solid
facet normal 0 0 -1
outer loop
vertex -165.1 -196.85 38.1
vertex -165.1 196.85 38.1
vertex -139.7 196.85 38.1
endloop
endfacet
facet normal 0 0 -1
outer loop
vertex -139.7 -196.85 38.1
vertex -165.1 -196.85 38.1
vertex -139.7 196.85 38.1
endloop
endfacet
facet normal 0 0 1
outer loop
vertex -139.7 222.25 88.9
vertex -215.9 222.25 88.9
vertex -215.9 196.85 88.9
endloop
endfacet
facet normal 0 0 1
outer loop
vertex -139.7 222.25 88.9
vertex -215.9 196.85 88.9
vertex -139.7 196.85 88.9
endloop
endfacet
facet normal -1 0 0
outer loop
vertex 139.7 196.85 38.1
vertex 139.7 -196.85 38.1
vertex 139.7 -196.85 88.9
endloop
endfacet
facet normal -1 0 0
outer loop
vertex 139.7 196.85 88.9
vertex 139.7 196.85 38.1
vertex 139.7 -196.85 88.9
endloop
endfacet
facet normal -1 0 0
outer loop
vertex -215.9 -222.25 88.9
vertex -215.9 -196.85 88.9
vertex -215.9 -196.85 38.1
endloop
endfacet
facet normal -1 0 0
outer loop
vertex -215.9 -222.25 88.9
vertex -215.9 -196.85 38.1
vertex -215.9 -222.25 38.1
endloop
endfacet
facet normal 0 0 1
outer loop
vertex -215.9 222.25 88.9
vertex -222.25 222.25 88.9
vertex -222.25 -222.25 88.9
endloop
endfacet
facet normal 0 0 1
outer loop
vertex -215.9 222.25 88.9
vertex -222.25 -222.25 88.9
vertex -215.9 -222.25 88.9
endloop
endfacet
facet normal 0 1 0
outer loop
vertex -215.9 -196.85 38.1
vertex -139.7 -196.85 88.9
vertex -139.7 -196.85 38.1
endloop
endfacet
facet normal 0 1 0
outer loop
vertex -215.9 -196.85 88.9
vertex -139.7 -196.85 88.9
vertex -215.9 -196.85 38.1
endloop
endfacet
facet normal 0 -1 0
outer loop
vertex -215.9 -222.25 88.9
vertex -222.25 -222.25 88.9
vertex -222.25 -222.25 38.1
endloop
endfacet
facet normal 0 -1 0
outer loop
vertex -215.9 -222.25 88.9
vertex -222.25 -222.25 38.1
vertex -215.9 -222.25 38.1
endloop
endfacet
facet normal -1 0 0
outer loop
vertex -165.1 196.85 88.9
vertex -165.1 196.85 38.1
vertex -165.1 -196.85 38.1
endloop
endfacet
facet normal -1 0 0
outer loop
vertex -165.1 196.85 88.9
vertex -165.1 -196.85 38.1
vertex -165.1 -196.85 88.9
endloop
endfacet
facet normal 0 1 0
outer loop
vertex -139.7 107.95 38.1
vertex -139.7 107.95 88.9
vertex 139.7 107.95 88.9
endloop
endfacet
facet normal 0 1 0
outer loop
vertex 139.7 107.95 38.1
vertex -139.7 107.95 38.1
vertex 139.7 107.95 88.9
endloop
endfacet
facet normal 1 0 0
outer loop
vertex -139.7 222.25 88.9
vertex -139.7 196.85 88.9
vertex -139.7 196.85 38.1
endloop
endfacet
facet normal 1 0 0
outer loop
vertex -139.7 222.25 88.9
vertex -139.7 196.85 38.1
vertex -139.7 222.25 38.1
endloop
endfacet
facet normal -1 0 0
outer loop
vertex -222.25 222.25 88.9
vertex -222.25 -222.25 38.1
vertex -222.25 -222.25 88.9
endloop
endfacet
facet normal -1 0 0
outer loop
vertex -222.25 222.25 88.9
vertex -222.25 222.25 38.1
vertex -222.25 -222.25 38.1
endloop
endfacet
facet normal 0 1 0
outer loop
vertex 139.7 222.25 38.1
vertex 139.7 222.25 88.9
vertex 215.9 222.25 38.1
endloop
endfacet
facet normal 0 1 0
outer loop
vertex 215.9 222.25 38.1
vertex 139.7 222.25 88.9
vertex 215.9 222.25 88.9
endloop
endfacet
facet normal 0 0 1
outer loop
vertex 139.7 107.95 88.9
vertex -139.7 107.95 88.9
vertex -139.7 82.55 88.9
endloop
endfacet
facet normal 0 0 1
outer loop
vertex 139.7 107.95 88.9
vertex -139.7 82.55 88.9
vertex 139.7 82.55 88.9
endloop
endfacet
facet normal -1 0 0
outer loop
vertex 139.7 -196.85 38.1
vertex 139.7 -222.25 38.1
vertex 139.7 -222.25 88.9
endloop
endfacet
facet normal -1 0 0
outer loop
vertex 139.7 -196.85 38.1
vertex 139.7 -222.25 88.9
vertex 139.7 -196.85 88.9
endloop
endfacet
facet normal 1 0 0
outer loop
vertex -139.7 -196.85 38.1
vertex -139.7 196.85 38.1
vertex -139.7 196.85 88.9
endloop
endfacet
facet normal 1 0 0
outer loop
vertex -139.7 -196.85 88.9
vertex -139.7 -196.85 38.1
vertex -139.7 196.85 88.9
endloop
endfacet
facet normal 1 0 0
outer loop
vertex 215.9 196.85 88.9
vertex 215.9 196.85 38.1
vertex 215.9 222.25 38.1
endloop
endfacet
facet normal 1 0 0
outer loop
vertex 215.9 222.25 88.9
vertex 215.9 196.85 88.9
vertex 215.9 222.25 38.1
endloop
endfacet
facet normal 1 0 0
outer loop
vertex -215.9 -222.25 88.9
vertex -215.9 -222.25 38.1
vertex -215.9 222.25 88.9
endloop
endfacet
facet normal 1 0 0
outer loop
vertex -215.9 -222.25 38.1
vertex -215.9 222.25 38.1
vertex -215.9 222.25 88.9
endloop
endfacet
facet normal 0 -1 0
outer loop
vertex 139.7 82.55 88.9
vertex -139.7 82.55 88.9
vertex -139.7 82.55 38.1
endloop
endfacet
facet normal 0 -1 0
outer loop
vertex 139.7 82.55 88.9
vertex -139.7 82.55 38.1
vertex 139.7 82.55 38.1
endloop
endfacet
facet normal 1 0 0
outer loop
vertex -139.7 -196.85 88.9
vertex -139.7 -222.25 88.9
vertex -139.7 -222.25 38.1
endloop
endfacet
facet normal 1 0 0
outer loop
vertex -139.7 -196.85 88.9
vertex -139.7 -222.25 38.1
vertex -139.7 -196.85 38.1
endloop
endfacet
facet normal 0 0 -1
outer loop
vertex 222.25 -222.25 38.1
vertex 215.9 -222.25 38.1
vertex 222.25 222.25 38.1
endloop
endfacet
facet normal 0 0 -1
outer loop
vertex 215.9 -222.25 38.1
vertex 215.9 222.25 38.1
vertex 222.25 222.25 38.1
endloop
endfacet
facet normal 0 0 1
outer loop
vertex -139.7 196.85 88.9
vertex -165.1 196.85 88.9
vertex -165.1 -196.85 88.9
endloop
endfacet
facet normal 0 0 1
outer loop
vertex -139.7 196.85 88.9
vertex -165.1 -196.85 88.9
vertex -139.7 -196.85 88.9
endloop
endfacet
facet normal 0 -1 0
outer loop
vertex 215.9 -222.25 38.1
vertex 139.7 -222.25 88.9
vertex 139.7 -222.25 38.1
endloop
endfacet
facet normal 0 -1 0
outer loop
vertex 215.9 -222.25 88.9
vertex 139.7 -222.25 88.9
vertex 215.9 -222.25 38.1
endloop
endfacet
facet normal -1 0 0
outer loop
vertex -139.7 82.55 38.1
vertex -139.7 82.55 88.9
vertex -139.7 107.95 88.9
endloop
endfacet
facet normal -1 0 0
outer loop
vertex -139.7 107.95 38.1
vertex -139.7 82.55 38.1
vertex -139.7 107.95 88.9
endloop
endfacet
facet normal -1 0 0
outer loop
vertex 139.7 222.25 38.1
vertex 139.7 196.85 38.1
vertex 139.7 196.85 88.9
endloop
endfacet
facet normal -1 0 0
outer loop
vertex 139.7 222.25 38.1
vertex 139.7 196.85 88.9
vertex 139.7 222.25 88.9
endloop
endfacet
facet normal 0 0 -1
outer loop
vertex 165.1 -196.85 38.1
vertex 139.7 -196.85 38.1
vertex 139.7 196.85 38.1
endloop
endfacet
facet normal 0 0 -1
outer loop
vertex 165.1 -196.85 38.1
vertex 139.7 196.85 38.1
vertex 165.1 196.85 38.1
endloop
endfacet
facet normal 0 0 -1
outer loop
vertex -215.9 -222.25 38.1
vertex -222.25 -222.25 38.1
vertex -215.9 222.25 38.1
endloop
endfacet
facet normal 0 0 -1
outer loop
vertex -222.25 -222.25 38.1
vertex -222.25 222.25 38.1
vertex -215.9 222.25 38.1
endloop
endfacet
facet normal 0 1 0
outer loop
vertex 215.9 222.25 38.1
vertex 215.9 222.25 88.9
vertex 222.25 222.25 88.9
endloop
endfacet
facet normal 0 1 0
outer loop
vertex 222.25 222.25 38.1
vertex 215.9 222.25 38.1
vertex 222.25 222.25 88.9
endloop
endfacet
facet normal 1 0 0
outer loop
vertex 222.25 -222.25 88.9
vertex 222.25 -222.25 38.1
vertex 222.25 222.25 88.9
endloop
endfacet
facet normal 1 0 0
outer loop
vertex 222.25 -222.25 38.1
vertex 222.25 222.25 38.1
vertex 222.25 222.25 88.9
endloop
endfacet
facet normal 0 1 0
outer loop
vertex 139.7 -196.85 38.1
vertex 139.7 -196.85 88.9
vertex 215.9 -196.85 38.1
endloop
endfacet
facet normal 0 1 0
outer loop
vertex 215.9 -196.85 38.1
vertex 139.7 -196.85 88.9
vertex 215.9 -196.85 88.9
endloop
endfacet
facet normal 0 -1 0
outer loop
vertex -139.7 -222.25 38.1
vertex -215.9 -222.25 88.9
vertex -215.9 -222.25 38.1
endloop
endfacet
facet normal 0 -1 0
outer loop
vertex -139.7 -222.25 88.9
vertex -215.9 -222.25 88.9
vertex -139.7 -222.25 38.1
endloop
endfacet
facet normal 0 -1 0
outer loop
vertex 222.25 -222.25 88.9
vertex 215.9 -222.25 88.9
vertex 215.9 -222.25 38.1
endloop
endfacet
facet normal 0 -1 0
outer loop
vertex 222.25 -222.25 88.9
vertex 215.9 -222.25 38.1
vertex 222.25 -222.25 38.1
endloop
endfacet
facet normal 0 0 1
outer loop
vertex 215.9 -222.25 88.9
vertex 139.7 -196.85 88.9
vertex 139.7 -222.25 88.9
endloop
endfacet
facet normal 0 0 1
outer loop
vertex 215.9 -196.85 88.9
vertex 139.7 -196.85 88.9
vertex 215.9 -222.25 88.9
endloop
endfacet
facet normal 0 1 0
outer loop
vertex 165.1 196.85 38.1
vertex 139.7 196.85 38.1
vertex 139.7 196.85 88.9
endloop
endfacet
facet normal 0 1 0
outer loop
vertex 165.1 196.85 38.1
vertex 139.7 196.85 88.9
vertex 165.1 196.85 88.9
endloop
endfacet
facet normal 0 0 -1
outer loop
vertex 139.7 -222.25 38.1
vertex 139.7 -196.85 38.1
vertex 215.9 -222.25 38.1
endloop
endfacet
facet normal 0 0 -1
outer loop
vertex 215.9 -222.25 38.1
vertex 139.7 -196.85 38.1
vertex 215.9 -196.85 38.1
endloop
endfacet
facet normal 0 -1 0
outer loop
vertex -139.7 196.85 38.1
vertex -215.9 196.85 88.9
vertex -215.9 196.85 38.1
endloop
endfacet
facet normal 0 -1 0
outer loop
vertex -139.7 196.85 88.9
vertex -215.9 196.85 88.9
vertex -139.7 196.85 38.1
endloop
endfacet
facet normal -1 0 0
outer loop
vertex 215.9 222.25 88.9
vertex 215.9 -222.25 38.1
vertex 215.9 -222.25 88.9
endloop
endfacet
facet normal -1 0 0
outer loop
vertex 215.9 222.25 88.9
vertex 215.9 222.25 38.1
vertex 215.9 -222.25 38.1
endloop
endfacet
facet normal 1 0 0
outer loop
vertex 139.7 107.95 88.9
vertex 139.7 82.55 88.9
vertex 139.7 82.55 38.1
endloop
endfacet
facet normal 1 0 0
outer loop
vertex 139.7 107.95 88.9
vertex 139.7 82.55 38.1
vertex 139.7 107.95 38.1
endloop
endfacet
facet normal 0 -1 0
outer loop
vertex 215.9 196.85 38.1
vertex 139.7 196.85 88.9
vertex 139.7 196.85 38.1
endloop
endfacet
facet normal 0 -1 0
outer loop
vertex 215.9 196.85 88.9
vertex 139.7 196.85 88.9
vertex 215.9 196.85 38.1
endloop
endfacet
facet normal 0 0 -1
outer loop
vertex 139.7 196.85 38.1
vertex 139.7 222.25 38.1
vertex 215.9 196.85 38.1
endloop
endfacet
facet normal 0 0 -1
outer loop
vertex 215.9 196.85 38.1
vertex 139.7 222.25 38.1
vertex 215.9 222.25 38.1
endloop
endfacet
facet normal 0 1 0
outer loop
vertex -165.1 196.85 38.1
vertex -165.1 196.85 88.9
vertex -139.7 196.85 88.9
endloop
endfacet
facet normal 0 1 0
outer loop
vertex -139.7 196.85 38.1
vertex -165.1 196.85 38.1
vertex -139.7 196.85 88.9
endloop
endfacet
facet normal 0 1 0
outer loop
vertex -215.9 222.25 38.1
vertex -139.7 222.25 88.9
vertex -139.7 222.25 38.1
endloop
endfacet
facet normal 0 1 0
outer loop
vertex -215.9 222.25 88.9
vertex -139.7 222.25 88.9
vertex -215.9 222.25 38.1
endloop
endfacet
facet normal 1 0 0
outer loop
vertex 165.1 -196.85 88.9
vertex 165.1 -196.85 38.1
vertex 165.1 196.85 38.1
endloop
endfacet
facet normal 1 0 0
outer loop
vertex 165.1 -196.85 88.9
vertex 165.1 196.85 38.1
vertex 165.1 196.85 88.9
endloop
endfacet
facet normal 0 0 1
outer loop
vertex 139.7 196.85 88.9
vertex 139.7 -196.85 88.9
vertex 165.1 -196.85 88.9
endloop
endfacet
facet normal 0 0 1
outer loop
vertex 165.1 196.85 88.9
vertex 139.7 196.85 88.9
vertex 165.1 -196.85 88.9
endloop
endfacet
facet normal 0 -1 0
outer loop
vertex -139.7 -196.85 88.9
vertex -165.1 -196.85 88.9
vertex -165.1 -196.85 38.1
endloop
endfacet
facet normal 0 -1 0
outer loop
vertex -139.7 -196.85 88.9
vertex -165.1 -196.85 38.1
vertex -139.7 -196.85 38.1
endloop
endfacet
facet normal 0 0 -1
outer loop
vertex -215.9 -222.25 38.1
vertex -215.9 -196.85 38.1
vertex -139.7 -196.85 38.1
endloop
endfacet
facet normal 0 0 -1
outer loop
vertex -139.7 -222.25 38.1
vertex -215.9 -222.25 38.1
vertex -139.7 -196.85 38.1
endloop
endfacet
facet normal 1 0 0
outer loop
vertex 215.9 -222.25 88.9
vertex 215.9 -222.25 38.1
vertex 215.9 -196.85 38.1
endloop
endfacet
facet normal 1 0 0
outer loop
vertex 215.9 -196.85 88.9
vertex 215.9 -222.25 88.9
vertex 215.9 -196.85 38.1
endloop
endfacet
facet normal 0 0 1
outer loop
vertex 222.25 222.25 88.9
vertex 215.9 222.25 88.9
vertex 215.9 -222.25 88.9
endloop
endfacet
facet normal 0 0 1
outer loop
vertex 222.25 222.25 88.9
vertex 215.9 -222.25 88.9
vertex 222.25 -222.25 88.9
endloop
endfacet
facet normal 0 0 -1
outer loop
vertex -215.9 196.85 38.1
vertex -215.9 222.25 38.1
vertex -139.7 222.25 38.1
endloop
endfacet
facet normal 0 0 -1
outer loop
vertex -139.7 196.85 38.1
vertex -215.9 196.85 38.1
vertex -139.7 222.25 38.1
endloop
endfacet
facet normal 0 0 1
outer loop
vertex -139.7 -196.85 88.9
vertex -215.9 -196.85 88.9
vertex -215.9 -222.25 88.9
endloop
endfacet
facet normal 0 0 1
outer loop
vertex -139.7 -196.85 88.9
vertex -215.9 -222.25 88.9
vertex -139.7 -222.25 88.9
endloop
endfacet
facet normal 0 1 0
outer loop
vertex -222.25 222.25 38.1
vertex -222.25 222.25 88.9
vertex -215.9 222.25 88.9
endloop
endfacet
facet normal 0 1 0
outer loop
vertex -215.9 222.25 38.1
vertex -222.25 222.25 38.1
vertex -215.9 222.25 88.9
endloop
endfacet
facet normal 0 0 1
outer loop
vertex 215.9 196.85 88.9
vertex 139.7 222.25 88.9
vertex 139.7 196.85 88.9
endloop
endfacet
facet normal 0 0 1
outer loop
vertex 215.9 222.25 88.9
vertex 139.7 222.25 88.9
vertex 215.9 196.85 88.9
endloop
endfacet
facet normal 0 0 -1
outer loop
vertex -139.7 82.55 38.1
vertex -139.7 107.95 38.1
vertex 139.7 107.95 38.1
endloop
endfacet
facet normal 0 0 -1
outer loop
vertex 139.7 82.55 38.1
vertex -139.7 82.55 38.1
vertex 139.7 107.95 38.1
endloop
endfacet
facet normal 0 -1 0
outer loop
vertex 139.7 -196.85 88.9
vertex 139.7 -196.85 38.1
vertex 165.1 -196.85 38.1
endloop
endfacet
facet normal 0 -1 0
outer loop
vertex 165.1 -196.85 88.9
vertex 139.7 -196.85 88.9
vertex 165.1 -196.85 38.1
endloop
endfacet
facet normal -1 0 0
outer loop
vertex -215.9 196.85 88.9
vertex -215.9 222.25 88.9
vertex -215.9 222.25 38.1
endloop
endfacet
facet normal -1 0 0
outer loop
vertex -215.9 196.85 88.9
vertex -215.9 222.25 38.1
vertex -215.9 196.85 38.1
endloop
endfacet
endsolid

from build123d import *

# Parameters (mm, degrees)
F1_W     = 6.35
F1_H     = 50.8
F1_W_2   = 25.4
F2_DEPTH = 222.25
F0_W     = 76.2
F0_H     = 25.4
F3_DEPTH = 176.53
F4_W     = 76.2
F4_H     = 25.4
F4_W_2   = 279.4
F5_DEPTH = 50.8


with BuildPart() as f2:
    # F1 (on Front) → F2 (new body, symmetric)
    with BuildSketch(Plane.XZ):
        with Locations((-219.075, 63.5)):
            Rectangle(F1_W, F1_H)
        with Locations((219.075, 63.5)):
            Rectangle(F1_W, F1_H)
        with Locations((-152.4, 63.5)):
            Rectangle(F1_W_2, F1_H)
        with Locations((152.4, 63.5)):
            Rectangle(F1_W_2, F1_H)
    extrude(amount=F2_DEPTH, both=True)

    # F0 (on Top) → F3 (cut)
    with BuildSketch(Plane.XY):
        with Locations((-177.8, 209.55)):
            Rectangle(F0_W, F0_H)
        with Locations((177.8, 209.55)):
            Rectangle(F0_W, F0_H)
        with Locations((177.8, -209.55)):
            Rectangle(F0_W, F0_H)
        with Locations((-177.8, -209.55)):
            Rectangle(F0_W, F0_H)
    extrude(amount=F3_DEPTH, mode=Mode.SUBTRACT)


with BuildPart() as f5:
    # F4 (on face) → F5 (new body)
    with BuildSketch(Plane.XY.offset(88.9)):
        Polygon((-139.7, 222.25), (-215.9, 222.25), (-215.9, 196.85), (-165.1, 196.85), (-139.7, 196.85), align=None)
        Polygon((-139.7, -196.85), (-165.1, -196.85), (-215.9, -196.85), (-215.9, -222.25), (-139.7, -222.25), align=None)
        with Locations((177.8, -209.55)):
            Rectangle(F4_W, F4_H)
        with Locations((177.8, 209.55)):
            Rectangle(F4_W, F4_H)
        with Locations((0, 95.25)):
            Rectangle(F4_W_2, F4_H)
    extrude(amount=-F5_DEPTH)


solid = Compound([f2.part, f5.part])
